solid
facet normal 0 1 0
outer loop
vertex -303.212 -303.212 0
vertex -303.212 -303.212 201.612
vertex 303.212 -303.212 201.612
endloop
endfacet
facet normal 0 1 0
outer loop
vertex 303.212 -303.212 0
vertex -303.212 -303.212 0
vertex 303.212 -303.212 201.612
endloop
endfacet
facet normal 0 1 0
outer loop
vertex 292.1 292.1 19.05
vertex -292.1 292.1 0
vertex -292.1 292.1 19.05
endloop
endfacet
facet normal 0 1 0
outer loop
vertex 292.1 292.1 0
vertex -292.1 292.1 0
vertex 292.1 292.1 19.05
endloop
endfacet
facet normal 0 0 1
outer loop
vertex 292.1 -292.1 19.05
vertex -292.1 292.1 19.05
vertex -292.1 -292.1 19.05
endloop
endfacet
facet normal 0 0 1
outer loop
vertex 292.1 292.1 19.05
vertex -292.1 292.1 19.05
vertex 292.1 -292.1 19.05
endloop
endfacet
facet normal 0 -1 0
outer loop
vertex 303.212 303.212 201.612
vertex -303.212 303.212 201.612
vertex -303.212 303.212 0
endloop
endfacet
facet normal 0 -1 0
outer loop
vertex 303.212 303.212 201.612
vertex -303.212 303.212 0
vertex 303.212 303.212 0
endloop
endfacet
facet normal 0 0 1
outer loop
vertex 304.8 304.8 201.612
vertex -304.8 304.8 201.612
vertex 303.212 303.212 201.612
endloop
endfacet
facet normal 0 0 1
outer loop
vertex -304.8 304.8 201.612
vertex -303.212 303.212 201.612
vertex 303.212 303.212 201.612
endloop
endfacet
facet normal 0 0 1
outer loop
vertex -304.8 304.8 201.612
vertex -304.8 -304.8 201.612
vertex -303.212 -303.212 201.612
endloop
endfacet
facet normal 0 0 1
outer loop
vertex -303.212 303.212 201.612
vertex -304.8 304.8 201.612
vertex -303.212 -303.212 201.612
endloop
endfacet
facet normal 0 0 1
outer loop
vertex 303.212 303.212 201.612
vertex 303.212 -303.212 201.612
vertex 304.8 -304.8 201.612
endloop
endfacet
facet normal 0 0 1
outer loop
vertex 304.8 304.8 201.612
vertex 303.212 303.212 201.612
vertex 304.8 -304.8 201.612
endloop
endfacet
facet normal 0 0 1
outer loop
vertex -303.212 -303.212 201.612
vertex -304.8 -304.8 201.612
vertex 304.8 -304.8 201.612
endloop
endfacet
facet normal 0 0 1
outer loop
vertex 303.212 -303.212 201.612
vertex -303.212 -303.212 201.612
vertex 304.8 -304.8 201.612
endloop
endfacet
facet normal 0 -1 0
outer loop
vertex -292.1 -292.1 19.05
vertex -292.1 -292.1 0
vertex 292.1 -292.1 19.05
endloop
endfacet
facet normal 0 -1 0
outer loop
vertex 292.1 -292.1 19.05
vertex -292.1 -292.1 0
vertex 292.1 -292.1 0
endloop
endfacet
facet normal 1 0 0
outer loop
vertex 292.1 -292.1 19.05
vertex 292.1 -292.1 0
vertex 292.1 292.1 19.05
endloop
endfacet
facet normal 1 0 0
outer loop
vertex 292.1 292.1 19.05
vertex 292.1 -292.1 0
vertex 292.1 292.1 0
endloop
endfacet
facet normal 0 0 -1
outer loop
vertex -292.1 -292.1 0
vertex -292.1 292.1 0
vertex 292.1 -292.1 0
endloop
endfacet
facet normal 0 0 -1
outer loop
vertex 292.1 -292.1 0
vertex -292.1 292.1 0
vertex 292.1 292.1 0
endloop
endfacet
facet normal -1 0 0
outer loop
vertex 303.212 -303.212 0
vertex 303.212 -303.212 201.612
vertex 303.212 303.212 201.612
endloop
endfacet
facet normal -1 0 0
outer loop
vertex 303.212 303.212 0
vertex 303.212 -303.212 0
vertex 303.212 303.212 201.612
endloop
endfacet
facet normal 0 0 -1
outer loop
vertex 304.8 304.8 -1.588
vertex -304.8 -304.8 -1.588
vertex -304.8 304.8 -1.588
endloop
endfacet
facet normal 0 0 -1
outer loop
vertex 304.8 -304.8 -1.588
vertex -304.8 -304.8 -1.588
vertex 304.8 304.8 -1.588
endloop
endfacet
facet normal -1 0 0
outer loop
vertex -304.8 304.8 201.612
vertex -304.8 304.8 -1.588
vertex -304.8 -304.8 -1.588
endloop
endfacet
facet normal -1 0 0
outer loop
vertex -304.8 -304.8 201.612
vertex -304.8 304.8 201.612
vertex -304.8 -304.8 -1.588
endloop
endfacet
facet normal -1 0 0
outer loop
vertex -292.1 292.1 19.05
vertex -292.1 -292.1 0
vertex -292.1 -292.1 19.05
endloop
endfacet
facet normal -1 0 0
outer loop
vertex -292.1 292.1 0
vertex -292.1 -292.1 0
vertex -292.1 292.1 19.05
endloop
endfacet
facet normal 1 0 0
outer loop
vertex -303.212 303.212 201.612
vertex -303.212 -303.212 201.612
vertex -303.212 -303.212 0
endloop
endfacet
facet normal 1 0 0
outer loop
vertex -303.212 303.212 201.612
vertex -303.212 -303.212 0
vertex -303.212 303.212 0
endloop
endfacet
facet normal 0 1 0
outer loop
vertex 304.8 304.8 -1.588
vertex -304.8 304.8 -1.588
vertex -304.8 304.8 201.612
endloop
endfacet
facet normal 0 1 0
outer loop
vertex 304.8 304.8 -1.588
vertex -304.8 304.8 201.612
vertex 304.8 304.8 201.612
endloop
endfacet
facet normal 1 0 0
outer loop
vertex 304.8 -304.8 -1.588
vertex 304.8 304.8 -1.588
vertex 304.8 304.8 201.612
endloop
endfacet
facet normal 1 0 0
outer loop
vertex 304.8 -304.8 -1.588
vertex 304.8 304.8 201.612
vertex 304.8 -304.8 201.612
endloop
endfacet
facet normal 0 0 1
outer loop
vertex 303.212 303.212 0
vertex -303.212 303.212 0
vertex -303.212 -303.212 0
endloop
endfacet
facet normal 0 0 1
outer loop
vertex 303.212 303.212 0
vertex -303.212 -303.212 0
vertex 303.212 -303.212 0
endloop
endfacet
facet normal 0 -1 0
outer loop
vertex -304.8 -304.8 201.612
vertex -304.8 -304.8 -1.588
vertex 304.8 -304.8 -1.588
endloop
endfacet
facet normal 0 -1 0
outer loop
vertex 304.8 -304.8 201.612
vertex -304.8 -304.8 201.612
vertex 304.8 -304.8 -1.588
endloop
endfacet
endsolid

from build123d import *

# Parameters (mm, degrees)
F0_W     = 584.2
F0_H     = 584.2
F1_DEPTH = 19.05
F3_W     = 609.6
F3_H     = 609.6
F4_DEPTH = 203.2
F5_W     = 606.425
F5_H     = 606.425
F6_DEPTH = 201.6125


with BuildPart() as f1:
    # F0 (on Top) → F1 (new body)
    with BuildSketch(Plane.XY):
        Rectangle(F0_W, F0_H)
    extrude(amount=F1_DEPTH)


with BuildPart() as f4:
    # F3 (on offset) → F4 (new body)
    with BuildSketch(Plane(origin=(0, 0, -1.5875), x_dir=(1, 0, 0), z_dir=(0, 0, -1))):
        Rectangle(F3_W, F3_H)
    extrude(amount=-F4_DEPTH)

    # F5 (on face) → F6 (cut, through all)
    with BuildSketch(Plane.XY.offset(201.6125)):
        Rectangle(F5_W, F5_H)
    extrude(amount=-F6_DEPTH, mode=Mode.SUBTRACT)


solid = Compound([f1.part, f4.part])
